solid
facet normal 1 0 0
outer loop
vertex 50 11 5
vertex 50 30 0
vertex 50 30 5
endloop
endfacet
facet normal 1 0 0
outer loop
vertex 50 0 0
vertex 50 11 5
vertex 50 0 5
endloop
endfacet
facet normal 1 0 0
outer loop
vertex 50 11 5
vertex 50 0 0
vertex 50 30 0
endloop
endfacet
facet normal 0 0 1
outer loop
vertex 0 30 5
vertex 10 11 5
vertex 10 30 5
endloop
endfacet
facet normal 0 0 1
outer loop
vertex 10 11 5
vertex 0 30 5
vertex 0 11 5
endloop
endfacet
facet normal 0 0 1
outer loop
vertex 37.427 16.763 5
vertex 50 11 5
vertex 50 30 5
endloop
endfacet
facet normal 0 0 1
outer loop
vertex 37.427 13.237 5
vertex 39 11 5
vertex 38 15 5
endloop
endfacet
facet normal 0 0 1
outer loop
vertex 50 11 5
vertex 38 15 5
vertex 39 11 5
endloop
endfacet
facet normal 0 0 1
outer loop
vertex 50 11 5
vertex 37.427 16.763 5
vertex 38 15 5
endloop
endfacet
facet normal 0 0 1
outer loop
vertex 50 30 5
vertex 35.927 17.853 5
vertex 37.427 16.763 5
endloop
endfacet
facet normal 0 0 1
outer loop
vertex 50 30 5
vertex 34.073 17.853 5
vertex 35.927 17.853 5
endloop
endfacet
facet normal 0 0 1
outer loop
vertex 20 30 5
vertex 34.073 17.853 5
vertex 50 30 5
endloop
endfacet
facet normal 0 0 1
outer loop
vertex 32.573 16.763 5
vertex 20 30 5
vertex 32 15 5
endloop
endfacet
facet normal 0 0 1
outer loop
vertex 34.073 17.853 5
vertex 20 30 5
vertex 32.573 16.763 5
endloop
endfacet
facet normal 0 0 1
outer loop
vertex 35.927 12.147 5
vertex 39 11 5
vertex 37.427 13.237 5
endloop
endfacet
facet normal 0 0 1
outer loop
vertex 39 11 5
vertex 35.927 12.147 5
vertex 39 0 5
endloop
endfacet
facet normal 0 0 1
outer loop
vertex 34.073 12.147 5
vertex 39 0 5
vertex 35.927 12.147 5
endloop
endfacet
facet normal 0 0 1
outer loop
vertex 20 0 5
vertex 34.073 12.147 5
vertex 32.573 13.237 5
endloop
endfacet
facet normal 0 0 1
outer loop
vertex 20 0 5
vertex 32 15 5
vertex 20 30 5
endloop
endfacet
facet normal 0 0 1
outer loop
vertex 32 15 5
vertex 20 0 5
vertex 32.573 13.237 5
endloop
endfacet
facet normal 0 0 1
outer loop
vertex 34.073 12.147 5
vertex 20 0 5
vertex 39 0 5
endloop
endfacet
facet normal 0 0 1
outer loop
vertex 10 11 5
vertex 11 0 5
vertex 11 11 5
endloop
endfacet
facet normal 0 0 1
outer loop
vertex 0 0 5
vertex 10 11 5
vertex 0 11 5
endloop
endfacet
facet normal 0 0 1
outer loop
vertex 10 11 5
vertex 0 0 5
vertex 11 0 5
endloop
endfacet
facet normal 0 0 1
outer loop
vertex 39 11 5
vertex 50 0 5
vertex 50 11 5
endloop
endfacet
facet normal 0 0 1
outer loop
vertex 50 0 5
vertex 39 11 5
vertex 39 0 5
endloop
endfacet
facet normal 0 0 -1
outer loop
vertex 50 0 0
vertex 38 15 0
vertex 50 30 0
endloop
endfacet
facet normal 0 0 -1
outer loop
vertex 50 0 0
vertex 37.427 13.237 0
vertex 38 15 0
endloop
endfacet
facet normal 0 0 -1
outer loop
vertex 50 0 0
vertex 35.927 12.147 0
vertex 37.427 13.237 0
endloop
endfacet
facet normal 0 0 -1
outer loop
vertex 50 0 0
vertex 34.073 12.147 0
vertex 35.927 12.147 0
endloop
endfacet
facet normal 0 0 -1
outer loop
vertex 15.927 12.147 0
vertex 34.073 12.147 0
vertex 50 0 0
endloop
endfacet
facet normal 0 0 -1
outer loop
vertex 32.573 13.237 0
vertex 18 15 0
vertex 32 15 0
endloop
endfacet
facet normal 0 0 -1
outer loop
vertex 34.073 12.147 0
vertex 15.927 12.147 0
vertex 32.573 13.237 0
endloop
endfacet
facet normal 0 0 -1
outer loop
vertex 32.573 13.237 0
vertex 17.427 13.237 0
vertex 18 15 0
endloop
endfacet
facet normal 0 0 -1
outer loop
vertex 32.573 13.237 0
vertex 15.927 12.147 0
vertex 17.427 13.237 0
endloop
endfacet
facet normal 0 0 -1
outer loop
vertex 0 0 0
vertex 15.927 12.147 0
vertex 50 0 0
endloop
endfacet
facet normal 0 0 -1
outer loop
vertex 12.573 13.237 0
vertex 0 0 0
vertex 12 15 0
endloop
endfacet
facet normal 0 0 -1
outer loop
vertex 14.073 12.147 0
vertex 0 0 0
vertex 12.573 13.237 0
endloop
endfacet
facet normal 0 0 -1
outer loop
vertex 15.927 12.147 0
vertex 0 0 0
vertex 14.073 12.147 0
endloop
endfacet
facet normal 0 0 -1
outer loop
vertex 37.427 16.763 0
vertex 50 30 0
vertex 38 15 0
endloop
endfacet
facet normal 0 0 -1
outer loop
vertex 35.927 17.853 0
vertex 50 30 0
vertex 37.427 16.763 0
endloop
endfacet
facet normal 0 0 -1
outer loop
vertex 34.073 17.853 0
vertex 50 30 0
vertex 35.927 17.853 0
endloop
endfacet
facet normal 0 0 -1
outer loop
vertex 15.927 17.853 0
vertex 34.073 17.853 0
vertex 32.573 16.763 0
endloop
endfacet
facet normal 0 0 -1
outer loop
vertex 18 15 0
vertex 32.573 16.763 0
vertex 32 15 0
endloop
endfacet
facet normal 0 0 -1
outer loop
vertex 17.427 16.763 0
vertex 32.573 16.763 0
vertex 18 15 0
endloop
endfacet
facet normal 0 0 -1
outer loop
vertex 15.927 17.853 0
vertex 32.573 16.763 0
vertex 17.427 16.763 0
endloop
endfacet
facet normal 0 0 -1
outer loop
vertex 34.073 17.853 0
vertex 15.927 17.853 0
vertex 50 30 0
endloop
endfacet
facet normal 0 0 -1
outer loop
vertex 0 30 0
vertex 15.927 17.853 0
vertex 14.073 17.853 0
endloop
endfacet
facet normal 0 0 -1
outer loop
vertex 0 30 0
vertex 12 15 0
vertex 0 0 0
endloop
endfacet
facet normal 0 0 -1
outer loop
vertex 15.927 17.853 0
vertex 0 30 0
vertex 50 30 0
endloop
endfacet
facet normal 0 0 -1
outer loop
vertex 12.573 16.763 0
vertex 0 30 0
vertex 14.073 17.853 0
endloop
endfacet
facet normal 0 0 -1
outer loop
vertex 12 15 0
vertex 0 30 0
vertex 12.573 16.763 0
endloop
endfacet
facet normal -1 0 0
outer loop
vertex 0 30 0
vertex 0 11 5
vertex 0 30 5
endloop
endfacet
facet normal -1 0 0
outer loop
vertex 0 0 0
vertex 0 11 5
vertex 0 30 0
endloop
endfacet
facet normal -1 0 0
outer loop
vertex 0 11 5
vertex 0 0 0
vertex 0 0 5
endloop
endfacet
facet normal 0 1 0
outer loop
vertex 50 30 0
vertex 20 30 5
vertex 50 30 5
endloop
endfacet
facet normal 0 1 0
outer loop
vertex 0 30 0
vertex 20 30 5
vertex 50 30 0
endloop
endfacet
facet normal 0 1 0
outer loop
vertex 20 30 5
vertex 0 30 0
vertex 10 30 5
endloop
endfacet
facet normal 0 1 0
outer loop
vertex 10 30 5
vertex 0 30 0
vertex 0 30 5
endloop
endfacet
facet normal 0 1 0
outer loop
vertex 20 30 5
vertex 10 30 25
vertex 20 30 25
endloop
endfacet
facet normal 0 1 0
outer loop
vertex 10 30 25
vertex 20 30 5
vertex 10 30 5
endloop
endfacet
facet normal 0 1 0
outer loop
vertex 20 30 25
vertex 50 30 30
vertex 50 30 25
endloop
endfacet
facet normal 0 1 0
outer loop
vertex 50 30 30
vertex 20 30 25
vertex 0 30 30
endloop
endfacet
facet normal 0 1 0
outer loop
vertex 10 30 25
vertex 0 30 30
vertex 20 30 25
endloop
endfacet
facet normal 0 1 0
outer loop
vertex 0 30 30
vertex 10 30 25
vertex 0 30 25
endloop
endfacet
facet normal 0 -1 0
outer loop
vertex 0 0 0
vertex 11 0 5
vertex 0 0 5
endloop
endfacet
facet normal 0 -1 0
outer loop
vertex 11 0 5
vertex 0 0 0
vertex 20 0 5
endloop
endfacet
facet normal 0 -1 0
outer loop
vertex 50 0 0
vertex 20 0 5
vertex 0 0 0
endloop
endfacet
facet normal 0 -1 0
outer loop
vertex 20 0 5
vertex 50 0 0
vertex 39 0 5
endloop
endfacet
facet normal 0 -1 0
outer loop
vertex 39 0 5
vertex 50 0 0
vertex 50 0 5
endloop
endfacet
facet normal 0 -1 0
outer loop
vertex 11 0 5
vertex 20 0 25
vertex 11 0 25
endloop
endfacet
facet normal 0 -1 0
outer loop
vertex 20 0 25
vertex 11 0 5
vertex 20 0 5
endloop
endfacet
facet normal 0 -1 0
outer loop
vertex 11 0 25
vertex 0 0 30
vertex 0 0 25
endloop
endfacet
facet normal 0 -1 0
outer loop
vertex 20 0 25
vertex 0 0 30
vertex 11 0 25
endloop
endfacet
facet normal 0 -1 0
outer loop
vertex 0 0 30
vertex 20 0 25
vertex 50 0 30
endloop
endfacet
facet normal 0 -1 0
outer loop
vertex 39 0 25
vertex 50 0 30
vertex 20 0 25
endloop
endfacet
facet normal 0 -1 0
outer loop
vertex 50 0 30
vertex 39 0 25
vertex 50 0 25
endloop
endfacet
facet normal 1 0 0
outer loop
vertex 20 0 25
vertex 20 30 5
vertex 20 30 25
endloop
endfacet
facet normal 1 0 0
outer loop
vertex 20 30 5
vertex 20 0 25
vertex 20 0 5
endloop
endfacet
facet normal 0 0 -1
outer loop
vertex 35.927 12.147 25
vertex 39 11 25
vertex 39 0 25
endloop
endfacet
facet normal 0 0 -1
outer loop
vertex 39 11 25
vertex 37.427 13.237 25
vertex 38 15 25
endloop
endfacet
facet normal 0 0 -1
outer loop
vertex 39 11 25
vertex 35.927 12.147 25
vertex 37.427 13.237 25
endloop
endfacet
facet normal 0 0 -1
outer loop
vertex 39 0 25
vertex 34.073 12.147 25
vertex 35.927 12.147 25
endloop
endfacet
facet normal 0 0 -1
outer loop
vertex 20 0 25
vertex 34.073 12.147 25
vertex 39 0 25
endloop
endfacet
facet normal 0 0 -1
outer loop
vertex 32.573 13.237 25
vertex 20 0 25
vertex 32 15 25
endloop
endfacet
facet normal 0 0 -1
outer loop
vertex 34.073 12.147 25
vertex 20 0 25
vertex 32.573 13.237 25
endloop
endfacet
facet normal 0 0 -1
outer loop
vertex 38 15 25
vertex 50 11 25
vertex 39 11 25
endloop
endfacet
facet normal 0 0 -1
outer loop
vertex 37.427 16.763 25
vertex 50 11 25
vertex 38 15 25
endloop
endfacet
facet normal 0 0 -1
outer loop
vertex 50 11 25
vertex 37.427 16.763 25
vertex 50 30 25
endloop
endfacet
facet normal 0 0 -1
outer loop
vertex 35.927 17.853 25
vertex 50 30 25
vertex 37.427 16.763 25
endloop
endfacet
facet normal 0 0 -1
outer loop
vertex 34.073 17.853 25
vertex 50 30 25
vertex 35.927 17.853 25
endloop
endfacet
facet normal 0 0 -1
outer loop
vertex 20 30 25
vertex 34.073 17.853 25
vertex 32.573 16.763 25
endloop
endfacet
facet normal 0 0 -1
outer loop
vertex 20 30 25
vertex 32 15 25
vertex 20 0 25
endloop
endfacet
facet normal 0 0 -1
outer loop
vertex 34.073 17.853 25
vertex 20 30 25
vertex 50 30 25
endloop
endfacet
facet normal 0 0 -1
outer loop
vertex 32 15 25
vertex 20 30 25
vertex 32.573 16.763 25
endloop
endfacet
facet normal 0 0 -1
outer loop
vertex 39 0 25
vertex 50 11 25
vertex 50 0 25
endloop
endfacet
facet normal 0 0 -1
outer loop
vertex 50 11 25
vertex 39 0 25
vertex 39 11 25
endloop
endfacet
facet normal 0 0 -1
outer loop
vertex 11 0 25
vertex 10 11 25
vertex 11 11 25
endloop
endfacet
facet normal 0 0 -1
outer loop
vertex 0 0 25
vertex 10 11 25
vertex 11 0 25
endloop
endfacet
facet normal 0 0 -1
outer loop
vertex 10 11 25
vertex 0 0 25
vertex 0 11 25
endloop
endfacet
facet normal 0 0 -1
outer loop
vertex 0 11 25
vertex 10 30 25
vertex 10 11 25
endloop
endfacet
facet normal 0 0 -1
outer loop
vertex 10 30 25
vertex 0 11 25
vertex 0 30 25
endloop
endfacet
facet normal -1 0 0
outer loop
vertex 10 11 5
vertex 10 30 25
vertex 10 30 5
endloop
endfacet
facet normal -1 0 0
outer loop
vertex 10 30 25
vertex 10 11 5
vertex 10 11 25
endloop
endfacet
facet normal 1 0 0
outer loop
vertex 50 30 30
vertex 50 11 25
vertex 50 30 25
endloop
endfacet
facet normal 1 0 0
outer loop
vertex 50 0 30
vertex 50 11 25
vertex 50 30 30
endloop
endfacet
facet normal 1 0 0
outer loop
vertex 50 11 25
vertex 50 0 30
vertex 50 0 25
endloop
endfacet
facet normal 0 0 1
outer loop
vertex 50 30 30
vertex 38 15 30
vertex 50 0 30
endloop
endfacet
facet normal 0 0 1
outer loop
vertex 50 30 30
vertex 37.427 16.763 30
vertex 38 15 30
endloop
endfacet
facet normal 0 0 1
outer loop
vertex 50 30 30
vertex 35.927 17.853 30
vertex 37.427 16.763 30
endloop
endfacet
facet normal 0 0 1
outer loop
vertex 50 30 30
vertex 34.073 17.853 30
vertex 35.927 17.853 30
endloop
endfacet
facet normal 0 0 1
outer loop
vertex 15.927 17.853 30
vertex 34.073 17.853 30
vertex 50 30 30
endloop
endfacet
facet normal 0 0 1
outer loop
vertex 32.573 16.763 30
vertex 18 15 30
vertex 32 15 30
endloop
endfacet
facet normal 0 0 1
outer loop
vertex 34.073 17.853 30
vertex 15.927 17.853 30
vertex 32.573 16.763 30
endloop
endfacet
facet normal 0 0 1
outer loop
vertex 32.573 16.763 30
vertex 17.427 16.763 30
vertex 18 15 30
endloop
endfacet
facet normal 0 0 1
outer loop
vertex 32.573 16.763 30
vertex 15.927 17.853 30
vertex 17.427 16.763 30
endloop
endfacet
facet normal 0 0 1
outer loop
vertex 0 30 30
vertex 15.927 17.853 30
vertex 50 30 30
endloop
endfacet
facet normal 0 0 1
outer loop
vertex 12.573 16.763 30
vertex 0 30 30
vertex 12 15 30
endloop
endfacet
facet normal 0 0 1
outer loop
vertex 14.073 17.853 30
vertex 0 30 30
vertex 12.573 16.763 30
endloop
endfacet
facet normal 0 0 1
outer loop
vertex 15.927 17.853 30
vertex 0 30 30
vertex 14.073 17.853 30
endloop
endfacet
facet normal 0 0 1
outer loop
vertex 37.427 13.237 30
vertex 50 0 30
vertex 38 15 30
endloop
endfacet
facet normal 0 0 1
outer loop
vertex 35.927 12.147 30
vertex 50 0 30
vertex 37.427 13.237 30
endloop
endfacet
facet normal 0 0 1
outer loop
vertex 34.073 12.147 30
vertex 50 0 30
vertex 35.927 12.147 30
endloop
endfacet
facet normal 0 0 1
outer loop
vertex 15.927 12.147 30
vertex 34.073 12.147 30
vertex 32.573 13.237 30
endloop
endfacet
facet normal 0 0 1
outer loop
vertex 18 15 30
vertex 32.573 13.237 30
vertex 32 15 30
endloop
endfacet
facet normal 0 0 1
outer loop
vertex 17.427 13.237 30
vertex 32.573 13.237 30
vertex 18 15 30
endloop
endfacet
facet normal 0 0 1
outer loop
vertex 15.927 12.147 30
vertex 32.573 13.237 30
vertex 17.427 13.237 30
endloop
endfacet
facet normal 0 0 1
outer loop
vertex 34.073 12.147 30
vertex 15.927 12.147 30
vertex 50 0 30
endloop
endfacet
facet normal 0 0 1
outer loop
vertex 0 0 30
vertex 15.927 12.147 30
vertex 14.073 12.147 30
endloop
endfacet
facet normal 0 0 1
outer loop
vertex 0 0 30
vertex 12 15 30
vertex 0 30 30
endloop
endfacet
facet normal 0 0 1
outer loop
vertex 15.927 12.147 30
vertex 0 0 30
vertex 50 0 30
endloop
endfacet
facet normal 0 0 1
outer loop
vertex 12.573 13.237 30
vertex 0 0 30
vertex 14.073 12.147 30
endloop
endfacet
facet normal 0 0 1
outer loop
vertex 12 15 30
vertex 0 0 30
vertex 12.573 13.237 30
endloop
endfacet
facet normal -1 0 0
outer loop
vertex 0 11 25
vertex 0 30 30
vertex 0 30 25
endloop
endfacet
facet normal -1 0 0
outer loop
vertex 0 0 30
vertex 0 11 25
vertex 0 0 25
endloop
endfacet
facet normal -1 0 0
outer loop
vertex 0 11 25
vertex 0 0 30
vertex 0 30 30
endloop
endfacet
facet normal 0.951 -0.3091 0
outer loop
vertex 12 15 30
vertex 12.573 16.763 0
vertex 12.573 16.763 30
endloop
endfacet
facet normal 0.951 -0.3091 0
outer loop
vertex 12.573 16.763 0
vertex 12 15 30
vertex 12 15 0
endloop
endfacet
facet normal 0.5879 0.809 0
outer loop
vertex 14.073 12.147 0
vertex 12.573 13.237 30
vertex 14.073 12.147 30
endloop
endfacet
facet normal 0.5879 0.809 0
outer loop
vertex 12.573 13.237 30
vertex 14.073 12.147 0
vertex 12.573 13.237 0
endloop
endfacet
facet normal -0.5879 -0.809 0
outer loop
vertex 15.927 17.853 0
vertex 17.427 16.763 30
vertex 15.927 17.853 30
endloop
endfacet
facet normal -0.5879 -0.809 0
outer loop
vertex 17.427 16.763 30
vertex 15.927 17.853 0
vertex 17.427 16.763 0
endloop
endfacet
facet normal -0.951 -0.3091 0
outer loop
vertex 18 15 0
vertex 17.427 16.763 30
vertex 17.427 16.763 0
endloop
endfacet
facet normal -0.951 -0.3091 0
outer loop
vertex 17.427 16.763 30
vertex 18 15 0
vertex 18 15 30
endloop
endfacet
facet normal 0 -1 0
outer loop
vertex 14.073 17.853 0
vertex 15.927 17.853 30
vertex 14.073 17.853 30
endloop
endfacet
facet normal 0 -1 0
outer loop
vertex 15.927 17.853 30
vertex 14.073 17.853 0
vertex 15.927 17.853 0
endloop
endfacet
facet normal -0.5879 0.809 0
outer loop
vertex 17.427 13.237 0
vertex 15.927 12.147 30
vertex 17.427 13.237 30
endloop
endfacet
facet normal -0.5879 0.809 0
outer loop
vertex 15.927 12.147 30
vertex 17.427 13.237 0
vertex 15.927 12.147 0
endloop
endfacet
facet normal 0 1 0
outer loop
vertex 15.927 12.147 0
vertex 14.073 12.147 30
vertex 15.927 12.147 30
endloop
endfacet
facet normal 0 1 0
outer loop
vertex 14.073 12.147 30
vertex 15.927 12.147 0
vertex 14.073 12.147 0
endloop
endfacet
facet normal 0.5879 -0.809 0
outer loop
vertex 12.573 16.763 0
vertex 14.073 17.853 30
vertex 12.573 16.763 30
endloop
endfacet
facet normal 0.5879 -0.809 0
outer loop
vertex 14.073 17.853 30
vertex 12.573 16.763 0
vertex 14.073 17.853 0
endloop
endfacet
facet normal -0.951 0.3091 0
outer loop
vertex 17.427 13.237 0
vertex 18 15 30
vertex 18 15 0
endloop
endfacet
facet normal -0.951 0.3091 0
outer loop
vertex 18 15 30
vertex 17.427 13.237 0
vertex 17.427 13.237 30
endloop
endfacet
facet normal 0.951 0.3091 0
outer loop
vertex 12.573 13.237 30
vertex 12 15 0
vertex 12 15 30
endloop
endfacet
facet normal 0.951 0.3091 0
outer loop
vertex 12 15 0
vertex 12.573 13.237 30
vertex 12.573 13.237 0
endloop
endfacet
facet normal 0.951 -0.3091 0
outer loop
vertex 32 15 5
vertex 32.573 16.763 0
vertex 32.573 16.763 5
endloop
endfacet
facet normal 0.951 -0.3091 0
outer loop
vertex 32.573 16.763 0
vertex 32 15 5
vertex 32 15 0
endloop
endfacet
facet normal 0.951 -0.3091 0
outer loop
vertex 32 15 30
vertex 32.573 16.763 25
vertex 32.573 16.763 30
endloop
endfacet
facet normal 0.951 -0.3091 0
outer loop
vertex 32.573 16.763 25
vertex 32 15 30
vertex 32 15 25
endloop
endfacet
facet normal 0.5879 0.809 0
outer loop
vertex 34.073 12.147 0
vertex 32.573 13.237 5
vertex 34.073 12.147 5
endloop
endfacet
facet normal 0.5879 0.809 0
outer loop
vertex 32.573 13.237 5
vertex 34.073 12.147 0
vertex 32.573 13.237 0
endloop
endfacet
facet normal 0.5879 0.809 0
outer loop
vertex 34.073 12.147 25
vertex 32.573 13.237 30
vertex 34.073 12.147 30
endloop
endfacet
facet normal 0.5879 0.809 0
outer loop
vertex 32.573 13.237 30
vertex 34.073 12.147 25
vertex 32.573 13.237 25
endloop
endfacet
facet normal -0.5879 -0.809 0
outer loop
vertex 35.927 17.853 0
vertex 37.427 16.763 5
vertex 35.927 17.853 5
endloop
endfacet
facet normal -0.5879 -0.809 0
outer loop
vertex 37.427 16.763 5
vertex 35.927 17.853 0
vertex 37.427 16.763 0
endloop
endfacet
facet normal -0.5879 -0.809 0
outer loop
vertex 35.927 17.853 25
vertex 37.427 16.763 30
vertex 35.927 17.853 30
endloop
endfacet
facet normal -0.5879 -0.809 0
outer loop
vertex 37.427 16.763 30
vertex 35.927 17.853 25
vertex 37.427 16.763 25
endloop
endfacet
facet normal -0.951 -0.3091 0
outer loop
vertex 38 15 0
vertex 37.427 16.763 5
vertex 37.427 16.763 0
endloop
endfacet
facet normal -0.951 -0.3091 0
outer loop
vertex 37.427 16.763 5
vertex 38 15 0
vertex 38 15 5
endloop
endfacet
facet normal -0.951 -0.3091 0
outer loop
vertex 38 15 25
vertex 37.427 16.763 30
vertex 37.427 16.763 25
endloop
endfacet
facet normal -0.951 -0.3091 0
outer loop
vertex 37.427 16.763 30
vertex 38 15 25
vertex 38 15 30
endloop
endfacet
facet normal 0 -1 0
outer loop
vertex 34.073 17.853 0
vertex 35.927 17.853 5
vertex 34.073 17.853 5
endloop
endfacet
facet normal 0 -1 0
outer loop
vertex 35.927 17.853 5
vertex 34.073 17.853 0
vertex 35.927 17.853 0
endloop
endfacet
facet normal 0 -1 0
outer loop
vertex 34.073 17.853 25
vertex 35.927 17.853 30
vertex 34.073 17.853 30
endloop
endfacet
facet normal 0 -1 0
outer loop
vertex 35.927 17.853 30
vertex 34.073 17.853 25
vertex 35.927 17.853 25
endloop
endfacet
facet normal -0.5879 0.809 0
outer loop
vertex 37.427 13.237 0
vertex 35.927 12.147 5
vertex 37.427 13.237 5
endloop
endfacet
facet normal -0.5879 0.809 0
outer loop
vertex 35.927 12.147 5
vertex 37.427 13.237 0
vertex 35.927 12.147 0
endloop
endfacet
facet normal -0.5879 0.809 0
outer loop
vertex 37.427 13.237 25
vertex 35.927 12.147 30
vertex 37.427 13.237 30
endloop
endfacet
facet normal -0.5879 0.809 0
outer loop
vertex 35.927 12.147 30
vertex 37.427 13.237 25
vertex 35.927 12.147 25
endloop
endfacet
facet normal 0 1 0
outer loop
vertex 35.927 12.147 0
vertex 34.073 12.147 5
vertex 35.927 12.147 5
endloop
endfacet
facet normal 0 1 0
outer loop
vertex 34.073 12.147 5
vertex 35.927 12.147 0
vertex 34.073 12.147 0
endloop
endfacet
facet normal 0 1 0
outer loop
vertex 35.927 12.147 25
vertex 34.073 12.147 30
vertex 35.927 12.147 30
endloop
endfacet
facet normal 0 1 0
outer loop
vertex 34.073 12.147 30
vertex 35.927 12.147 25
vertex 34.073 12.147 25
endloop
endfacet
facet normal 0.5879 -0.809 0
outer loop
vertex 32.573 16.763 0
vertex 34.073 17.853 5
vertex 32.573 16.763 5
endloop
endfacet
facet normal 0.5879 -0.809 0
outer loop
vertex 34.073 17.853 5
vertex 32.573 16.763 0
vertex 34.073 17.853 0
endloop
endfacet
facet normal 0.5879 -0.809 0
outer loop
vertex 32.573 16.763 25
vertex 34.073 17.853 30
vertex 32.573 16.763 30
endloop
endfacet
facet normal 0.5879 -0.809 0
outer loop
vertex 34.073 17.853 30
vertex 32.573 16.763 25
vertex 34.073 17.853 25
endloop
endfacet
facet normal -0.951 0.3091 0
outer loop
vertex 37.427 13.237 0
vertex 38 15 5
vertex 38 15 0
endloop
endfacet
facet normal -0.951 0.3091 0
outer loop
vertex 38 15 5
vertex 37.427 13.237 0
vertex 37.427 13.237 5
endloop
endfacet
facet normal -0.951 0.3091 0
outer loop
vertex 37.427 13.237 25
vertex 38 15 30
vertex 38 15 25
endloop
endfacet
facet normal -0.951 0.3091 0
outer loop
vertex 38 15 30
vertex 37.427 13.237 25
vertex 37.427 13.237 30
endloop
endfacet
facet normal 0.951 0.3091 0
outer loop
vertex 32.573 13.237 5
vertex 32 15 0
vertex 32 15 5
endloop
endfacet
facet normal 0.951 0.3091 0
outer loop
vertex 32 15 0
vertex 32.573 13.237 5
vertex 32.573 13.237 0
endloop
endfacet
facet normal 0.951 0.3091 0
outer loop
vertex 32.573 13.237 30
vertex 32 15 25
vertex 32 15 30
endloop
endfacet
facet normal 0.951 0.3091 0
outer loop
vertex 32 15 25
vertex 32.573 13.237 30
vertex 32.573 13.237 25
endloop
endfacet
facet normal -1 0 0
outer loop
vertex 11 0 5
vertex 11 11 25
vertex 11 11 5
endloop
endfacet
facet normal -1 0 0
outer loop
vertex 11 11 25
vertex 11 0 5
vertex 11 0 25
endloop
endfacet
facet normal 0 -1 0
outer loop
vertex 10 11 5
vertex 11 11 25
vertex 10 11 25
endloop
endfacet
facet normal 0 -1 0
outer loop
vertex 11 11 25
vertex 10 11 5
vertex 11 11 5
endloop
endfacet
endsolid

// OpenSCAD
// Mechanical part - bracket-like structure
difference() {
    union() {
        // Base plate
        cube([50, 30, 5]);
        // Vertical support
        translate([10, 0, 5]) cube([10, 30, 20]);
        // Top plate
        translate([0, 0, 25]) cube([50, 30, 5]);
    }
    // Holes
    translate([15, 15, -1]) cylinder(h=32, r=3);
    translate([35, 15, -1]) cylinder(h=32, r=3);
    // Corner cutouts
    translate([-1, -1, 5]) cube([12, 12, 20]);
    translate([39, -1, 5]) cube([12, 12, 20]);
}
